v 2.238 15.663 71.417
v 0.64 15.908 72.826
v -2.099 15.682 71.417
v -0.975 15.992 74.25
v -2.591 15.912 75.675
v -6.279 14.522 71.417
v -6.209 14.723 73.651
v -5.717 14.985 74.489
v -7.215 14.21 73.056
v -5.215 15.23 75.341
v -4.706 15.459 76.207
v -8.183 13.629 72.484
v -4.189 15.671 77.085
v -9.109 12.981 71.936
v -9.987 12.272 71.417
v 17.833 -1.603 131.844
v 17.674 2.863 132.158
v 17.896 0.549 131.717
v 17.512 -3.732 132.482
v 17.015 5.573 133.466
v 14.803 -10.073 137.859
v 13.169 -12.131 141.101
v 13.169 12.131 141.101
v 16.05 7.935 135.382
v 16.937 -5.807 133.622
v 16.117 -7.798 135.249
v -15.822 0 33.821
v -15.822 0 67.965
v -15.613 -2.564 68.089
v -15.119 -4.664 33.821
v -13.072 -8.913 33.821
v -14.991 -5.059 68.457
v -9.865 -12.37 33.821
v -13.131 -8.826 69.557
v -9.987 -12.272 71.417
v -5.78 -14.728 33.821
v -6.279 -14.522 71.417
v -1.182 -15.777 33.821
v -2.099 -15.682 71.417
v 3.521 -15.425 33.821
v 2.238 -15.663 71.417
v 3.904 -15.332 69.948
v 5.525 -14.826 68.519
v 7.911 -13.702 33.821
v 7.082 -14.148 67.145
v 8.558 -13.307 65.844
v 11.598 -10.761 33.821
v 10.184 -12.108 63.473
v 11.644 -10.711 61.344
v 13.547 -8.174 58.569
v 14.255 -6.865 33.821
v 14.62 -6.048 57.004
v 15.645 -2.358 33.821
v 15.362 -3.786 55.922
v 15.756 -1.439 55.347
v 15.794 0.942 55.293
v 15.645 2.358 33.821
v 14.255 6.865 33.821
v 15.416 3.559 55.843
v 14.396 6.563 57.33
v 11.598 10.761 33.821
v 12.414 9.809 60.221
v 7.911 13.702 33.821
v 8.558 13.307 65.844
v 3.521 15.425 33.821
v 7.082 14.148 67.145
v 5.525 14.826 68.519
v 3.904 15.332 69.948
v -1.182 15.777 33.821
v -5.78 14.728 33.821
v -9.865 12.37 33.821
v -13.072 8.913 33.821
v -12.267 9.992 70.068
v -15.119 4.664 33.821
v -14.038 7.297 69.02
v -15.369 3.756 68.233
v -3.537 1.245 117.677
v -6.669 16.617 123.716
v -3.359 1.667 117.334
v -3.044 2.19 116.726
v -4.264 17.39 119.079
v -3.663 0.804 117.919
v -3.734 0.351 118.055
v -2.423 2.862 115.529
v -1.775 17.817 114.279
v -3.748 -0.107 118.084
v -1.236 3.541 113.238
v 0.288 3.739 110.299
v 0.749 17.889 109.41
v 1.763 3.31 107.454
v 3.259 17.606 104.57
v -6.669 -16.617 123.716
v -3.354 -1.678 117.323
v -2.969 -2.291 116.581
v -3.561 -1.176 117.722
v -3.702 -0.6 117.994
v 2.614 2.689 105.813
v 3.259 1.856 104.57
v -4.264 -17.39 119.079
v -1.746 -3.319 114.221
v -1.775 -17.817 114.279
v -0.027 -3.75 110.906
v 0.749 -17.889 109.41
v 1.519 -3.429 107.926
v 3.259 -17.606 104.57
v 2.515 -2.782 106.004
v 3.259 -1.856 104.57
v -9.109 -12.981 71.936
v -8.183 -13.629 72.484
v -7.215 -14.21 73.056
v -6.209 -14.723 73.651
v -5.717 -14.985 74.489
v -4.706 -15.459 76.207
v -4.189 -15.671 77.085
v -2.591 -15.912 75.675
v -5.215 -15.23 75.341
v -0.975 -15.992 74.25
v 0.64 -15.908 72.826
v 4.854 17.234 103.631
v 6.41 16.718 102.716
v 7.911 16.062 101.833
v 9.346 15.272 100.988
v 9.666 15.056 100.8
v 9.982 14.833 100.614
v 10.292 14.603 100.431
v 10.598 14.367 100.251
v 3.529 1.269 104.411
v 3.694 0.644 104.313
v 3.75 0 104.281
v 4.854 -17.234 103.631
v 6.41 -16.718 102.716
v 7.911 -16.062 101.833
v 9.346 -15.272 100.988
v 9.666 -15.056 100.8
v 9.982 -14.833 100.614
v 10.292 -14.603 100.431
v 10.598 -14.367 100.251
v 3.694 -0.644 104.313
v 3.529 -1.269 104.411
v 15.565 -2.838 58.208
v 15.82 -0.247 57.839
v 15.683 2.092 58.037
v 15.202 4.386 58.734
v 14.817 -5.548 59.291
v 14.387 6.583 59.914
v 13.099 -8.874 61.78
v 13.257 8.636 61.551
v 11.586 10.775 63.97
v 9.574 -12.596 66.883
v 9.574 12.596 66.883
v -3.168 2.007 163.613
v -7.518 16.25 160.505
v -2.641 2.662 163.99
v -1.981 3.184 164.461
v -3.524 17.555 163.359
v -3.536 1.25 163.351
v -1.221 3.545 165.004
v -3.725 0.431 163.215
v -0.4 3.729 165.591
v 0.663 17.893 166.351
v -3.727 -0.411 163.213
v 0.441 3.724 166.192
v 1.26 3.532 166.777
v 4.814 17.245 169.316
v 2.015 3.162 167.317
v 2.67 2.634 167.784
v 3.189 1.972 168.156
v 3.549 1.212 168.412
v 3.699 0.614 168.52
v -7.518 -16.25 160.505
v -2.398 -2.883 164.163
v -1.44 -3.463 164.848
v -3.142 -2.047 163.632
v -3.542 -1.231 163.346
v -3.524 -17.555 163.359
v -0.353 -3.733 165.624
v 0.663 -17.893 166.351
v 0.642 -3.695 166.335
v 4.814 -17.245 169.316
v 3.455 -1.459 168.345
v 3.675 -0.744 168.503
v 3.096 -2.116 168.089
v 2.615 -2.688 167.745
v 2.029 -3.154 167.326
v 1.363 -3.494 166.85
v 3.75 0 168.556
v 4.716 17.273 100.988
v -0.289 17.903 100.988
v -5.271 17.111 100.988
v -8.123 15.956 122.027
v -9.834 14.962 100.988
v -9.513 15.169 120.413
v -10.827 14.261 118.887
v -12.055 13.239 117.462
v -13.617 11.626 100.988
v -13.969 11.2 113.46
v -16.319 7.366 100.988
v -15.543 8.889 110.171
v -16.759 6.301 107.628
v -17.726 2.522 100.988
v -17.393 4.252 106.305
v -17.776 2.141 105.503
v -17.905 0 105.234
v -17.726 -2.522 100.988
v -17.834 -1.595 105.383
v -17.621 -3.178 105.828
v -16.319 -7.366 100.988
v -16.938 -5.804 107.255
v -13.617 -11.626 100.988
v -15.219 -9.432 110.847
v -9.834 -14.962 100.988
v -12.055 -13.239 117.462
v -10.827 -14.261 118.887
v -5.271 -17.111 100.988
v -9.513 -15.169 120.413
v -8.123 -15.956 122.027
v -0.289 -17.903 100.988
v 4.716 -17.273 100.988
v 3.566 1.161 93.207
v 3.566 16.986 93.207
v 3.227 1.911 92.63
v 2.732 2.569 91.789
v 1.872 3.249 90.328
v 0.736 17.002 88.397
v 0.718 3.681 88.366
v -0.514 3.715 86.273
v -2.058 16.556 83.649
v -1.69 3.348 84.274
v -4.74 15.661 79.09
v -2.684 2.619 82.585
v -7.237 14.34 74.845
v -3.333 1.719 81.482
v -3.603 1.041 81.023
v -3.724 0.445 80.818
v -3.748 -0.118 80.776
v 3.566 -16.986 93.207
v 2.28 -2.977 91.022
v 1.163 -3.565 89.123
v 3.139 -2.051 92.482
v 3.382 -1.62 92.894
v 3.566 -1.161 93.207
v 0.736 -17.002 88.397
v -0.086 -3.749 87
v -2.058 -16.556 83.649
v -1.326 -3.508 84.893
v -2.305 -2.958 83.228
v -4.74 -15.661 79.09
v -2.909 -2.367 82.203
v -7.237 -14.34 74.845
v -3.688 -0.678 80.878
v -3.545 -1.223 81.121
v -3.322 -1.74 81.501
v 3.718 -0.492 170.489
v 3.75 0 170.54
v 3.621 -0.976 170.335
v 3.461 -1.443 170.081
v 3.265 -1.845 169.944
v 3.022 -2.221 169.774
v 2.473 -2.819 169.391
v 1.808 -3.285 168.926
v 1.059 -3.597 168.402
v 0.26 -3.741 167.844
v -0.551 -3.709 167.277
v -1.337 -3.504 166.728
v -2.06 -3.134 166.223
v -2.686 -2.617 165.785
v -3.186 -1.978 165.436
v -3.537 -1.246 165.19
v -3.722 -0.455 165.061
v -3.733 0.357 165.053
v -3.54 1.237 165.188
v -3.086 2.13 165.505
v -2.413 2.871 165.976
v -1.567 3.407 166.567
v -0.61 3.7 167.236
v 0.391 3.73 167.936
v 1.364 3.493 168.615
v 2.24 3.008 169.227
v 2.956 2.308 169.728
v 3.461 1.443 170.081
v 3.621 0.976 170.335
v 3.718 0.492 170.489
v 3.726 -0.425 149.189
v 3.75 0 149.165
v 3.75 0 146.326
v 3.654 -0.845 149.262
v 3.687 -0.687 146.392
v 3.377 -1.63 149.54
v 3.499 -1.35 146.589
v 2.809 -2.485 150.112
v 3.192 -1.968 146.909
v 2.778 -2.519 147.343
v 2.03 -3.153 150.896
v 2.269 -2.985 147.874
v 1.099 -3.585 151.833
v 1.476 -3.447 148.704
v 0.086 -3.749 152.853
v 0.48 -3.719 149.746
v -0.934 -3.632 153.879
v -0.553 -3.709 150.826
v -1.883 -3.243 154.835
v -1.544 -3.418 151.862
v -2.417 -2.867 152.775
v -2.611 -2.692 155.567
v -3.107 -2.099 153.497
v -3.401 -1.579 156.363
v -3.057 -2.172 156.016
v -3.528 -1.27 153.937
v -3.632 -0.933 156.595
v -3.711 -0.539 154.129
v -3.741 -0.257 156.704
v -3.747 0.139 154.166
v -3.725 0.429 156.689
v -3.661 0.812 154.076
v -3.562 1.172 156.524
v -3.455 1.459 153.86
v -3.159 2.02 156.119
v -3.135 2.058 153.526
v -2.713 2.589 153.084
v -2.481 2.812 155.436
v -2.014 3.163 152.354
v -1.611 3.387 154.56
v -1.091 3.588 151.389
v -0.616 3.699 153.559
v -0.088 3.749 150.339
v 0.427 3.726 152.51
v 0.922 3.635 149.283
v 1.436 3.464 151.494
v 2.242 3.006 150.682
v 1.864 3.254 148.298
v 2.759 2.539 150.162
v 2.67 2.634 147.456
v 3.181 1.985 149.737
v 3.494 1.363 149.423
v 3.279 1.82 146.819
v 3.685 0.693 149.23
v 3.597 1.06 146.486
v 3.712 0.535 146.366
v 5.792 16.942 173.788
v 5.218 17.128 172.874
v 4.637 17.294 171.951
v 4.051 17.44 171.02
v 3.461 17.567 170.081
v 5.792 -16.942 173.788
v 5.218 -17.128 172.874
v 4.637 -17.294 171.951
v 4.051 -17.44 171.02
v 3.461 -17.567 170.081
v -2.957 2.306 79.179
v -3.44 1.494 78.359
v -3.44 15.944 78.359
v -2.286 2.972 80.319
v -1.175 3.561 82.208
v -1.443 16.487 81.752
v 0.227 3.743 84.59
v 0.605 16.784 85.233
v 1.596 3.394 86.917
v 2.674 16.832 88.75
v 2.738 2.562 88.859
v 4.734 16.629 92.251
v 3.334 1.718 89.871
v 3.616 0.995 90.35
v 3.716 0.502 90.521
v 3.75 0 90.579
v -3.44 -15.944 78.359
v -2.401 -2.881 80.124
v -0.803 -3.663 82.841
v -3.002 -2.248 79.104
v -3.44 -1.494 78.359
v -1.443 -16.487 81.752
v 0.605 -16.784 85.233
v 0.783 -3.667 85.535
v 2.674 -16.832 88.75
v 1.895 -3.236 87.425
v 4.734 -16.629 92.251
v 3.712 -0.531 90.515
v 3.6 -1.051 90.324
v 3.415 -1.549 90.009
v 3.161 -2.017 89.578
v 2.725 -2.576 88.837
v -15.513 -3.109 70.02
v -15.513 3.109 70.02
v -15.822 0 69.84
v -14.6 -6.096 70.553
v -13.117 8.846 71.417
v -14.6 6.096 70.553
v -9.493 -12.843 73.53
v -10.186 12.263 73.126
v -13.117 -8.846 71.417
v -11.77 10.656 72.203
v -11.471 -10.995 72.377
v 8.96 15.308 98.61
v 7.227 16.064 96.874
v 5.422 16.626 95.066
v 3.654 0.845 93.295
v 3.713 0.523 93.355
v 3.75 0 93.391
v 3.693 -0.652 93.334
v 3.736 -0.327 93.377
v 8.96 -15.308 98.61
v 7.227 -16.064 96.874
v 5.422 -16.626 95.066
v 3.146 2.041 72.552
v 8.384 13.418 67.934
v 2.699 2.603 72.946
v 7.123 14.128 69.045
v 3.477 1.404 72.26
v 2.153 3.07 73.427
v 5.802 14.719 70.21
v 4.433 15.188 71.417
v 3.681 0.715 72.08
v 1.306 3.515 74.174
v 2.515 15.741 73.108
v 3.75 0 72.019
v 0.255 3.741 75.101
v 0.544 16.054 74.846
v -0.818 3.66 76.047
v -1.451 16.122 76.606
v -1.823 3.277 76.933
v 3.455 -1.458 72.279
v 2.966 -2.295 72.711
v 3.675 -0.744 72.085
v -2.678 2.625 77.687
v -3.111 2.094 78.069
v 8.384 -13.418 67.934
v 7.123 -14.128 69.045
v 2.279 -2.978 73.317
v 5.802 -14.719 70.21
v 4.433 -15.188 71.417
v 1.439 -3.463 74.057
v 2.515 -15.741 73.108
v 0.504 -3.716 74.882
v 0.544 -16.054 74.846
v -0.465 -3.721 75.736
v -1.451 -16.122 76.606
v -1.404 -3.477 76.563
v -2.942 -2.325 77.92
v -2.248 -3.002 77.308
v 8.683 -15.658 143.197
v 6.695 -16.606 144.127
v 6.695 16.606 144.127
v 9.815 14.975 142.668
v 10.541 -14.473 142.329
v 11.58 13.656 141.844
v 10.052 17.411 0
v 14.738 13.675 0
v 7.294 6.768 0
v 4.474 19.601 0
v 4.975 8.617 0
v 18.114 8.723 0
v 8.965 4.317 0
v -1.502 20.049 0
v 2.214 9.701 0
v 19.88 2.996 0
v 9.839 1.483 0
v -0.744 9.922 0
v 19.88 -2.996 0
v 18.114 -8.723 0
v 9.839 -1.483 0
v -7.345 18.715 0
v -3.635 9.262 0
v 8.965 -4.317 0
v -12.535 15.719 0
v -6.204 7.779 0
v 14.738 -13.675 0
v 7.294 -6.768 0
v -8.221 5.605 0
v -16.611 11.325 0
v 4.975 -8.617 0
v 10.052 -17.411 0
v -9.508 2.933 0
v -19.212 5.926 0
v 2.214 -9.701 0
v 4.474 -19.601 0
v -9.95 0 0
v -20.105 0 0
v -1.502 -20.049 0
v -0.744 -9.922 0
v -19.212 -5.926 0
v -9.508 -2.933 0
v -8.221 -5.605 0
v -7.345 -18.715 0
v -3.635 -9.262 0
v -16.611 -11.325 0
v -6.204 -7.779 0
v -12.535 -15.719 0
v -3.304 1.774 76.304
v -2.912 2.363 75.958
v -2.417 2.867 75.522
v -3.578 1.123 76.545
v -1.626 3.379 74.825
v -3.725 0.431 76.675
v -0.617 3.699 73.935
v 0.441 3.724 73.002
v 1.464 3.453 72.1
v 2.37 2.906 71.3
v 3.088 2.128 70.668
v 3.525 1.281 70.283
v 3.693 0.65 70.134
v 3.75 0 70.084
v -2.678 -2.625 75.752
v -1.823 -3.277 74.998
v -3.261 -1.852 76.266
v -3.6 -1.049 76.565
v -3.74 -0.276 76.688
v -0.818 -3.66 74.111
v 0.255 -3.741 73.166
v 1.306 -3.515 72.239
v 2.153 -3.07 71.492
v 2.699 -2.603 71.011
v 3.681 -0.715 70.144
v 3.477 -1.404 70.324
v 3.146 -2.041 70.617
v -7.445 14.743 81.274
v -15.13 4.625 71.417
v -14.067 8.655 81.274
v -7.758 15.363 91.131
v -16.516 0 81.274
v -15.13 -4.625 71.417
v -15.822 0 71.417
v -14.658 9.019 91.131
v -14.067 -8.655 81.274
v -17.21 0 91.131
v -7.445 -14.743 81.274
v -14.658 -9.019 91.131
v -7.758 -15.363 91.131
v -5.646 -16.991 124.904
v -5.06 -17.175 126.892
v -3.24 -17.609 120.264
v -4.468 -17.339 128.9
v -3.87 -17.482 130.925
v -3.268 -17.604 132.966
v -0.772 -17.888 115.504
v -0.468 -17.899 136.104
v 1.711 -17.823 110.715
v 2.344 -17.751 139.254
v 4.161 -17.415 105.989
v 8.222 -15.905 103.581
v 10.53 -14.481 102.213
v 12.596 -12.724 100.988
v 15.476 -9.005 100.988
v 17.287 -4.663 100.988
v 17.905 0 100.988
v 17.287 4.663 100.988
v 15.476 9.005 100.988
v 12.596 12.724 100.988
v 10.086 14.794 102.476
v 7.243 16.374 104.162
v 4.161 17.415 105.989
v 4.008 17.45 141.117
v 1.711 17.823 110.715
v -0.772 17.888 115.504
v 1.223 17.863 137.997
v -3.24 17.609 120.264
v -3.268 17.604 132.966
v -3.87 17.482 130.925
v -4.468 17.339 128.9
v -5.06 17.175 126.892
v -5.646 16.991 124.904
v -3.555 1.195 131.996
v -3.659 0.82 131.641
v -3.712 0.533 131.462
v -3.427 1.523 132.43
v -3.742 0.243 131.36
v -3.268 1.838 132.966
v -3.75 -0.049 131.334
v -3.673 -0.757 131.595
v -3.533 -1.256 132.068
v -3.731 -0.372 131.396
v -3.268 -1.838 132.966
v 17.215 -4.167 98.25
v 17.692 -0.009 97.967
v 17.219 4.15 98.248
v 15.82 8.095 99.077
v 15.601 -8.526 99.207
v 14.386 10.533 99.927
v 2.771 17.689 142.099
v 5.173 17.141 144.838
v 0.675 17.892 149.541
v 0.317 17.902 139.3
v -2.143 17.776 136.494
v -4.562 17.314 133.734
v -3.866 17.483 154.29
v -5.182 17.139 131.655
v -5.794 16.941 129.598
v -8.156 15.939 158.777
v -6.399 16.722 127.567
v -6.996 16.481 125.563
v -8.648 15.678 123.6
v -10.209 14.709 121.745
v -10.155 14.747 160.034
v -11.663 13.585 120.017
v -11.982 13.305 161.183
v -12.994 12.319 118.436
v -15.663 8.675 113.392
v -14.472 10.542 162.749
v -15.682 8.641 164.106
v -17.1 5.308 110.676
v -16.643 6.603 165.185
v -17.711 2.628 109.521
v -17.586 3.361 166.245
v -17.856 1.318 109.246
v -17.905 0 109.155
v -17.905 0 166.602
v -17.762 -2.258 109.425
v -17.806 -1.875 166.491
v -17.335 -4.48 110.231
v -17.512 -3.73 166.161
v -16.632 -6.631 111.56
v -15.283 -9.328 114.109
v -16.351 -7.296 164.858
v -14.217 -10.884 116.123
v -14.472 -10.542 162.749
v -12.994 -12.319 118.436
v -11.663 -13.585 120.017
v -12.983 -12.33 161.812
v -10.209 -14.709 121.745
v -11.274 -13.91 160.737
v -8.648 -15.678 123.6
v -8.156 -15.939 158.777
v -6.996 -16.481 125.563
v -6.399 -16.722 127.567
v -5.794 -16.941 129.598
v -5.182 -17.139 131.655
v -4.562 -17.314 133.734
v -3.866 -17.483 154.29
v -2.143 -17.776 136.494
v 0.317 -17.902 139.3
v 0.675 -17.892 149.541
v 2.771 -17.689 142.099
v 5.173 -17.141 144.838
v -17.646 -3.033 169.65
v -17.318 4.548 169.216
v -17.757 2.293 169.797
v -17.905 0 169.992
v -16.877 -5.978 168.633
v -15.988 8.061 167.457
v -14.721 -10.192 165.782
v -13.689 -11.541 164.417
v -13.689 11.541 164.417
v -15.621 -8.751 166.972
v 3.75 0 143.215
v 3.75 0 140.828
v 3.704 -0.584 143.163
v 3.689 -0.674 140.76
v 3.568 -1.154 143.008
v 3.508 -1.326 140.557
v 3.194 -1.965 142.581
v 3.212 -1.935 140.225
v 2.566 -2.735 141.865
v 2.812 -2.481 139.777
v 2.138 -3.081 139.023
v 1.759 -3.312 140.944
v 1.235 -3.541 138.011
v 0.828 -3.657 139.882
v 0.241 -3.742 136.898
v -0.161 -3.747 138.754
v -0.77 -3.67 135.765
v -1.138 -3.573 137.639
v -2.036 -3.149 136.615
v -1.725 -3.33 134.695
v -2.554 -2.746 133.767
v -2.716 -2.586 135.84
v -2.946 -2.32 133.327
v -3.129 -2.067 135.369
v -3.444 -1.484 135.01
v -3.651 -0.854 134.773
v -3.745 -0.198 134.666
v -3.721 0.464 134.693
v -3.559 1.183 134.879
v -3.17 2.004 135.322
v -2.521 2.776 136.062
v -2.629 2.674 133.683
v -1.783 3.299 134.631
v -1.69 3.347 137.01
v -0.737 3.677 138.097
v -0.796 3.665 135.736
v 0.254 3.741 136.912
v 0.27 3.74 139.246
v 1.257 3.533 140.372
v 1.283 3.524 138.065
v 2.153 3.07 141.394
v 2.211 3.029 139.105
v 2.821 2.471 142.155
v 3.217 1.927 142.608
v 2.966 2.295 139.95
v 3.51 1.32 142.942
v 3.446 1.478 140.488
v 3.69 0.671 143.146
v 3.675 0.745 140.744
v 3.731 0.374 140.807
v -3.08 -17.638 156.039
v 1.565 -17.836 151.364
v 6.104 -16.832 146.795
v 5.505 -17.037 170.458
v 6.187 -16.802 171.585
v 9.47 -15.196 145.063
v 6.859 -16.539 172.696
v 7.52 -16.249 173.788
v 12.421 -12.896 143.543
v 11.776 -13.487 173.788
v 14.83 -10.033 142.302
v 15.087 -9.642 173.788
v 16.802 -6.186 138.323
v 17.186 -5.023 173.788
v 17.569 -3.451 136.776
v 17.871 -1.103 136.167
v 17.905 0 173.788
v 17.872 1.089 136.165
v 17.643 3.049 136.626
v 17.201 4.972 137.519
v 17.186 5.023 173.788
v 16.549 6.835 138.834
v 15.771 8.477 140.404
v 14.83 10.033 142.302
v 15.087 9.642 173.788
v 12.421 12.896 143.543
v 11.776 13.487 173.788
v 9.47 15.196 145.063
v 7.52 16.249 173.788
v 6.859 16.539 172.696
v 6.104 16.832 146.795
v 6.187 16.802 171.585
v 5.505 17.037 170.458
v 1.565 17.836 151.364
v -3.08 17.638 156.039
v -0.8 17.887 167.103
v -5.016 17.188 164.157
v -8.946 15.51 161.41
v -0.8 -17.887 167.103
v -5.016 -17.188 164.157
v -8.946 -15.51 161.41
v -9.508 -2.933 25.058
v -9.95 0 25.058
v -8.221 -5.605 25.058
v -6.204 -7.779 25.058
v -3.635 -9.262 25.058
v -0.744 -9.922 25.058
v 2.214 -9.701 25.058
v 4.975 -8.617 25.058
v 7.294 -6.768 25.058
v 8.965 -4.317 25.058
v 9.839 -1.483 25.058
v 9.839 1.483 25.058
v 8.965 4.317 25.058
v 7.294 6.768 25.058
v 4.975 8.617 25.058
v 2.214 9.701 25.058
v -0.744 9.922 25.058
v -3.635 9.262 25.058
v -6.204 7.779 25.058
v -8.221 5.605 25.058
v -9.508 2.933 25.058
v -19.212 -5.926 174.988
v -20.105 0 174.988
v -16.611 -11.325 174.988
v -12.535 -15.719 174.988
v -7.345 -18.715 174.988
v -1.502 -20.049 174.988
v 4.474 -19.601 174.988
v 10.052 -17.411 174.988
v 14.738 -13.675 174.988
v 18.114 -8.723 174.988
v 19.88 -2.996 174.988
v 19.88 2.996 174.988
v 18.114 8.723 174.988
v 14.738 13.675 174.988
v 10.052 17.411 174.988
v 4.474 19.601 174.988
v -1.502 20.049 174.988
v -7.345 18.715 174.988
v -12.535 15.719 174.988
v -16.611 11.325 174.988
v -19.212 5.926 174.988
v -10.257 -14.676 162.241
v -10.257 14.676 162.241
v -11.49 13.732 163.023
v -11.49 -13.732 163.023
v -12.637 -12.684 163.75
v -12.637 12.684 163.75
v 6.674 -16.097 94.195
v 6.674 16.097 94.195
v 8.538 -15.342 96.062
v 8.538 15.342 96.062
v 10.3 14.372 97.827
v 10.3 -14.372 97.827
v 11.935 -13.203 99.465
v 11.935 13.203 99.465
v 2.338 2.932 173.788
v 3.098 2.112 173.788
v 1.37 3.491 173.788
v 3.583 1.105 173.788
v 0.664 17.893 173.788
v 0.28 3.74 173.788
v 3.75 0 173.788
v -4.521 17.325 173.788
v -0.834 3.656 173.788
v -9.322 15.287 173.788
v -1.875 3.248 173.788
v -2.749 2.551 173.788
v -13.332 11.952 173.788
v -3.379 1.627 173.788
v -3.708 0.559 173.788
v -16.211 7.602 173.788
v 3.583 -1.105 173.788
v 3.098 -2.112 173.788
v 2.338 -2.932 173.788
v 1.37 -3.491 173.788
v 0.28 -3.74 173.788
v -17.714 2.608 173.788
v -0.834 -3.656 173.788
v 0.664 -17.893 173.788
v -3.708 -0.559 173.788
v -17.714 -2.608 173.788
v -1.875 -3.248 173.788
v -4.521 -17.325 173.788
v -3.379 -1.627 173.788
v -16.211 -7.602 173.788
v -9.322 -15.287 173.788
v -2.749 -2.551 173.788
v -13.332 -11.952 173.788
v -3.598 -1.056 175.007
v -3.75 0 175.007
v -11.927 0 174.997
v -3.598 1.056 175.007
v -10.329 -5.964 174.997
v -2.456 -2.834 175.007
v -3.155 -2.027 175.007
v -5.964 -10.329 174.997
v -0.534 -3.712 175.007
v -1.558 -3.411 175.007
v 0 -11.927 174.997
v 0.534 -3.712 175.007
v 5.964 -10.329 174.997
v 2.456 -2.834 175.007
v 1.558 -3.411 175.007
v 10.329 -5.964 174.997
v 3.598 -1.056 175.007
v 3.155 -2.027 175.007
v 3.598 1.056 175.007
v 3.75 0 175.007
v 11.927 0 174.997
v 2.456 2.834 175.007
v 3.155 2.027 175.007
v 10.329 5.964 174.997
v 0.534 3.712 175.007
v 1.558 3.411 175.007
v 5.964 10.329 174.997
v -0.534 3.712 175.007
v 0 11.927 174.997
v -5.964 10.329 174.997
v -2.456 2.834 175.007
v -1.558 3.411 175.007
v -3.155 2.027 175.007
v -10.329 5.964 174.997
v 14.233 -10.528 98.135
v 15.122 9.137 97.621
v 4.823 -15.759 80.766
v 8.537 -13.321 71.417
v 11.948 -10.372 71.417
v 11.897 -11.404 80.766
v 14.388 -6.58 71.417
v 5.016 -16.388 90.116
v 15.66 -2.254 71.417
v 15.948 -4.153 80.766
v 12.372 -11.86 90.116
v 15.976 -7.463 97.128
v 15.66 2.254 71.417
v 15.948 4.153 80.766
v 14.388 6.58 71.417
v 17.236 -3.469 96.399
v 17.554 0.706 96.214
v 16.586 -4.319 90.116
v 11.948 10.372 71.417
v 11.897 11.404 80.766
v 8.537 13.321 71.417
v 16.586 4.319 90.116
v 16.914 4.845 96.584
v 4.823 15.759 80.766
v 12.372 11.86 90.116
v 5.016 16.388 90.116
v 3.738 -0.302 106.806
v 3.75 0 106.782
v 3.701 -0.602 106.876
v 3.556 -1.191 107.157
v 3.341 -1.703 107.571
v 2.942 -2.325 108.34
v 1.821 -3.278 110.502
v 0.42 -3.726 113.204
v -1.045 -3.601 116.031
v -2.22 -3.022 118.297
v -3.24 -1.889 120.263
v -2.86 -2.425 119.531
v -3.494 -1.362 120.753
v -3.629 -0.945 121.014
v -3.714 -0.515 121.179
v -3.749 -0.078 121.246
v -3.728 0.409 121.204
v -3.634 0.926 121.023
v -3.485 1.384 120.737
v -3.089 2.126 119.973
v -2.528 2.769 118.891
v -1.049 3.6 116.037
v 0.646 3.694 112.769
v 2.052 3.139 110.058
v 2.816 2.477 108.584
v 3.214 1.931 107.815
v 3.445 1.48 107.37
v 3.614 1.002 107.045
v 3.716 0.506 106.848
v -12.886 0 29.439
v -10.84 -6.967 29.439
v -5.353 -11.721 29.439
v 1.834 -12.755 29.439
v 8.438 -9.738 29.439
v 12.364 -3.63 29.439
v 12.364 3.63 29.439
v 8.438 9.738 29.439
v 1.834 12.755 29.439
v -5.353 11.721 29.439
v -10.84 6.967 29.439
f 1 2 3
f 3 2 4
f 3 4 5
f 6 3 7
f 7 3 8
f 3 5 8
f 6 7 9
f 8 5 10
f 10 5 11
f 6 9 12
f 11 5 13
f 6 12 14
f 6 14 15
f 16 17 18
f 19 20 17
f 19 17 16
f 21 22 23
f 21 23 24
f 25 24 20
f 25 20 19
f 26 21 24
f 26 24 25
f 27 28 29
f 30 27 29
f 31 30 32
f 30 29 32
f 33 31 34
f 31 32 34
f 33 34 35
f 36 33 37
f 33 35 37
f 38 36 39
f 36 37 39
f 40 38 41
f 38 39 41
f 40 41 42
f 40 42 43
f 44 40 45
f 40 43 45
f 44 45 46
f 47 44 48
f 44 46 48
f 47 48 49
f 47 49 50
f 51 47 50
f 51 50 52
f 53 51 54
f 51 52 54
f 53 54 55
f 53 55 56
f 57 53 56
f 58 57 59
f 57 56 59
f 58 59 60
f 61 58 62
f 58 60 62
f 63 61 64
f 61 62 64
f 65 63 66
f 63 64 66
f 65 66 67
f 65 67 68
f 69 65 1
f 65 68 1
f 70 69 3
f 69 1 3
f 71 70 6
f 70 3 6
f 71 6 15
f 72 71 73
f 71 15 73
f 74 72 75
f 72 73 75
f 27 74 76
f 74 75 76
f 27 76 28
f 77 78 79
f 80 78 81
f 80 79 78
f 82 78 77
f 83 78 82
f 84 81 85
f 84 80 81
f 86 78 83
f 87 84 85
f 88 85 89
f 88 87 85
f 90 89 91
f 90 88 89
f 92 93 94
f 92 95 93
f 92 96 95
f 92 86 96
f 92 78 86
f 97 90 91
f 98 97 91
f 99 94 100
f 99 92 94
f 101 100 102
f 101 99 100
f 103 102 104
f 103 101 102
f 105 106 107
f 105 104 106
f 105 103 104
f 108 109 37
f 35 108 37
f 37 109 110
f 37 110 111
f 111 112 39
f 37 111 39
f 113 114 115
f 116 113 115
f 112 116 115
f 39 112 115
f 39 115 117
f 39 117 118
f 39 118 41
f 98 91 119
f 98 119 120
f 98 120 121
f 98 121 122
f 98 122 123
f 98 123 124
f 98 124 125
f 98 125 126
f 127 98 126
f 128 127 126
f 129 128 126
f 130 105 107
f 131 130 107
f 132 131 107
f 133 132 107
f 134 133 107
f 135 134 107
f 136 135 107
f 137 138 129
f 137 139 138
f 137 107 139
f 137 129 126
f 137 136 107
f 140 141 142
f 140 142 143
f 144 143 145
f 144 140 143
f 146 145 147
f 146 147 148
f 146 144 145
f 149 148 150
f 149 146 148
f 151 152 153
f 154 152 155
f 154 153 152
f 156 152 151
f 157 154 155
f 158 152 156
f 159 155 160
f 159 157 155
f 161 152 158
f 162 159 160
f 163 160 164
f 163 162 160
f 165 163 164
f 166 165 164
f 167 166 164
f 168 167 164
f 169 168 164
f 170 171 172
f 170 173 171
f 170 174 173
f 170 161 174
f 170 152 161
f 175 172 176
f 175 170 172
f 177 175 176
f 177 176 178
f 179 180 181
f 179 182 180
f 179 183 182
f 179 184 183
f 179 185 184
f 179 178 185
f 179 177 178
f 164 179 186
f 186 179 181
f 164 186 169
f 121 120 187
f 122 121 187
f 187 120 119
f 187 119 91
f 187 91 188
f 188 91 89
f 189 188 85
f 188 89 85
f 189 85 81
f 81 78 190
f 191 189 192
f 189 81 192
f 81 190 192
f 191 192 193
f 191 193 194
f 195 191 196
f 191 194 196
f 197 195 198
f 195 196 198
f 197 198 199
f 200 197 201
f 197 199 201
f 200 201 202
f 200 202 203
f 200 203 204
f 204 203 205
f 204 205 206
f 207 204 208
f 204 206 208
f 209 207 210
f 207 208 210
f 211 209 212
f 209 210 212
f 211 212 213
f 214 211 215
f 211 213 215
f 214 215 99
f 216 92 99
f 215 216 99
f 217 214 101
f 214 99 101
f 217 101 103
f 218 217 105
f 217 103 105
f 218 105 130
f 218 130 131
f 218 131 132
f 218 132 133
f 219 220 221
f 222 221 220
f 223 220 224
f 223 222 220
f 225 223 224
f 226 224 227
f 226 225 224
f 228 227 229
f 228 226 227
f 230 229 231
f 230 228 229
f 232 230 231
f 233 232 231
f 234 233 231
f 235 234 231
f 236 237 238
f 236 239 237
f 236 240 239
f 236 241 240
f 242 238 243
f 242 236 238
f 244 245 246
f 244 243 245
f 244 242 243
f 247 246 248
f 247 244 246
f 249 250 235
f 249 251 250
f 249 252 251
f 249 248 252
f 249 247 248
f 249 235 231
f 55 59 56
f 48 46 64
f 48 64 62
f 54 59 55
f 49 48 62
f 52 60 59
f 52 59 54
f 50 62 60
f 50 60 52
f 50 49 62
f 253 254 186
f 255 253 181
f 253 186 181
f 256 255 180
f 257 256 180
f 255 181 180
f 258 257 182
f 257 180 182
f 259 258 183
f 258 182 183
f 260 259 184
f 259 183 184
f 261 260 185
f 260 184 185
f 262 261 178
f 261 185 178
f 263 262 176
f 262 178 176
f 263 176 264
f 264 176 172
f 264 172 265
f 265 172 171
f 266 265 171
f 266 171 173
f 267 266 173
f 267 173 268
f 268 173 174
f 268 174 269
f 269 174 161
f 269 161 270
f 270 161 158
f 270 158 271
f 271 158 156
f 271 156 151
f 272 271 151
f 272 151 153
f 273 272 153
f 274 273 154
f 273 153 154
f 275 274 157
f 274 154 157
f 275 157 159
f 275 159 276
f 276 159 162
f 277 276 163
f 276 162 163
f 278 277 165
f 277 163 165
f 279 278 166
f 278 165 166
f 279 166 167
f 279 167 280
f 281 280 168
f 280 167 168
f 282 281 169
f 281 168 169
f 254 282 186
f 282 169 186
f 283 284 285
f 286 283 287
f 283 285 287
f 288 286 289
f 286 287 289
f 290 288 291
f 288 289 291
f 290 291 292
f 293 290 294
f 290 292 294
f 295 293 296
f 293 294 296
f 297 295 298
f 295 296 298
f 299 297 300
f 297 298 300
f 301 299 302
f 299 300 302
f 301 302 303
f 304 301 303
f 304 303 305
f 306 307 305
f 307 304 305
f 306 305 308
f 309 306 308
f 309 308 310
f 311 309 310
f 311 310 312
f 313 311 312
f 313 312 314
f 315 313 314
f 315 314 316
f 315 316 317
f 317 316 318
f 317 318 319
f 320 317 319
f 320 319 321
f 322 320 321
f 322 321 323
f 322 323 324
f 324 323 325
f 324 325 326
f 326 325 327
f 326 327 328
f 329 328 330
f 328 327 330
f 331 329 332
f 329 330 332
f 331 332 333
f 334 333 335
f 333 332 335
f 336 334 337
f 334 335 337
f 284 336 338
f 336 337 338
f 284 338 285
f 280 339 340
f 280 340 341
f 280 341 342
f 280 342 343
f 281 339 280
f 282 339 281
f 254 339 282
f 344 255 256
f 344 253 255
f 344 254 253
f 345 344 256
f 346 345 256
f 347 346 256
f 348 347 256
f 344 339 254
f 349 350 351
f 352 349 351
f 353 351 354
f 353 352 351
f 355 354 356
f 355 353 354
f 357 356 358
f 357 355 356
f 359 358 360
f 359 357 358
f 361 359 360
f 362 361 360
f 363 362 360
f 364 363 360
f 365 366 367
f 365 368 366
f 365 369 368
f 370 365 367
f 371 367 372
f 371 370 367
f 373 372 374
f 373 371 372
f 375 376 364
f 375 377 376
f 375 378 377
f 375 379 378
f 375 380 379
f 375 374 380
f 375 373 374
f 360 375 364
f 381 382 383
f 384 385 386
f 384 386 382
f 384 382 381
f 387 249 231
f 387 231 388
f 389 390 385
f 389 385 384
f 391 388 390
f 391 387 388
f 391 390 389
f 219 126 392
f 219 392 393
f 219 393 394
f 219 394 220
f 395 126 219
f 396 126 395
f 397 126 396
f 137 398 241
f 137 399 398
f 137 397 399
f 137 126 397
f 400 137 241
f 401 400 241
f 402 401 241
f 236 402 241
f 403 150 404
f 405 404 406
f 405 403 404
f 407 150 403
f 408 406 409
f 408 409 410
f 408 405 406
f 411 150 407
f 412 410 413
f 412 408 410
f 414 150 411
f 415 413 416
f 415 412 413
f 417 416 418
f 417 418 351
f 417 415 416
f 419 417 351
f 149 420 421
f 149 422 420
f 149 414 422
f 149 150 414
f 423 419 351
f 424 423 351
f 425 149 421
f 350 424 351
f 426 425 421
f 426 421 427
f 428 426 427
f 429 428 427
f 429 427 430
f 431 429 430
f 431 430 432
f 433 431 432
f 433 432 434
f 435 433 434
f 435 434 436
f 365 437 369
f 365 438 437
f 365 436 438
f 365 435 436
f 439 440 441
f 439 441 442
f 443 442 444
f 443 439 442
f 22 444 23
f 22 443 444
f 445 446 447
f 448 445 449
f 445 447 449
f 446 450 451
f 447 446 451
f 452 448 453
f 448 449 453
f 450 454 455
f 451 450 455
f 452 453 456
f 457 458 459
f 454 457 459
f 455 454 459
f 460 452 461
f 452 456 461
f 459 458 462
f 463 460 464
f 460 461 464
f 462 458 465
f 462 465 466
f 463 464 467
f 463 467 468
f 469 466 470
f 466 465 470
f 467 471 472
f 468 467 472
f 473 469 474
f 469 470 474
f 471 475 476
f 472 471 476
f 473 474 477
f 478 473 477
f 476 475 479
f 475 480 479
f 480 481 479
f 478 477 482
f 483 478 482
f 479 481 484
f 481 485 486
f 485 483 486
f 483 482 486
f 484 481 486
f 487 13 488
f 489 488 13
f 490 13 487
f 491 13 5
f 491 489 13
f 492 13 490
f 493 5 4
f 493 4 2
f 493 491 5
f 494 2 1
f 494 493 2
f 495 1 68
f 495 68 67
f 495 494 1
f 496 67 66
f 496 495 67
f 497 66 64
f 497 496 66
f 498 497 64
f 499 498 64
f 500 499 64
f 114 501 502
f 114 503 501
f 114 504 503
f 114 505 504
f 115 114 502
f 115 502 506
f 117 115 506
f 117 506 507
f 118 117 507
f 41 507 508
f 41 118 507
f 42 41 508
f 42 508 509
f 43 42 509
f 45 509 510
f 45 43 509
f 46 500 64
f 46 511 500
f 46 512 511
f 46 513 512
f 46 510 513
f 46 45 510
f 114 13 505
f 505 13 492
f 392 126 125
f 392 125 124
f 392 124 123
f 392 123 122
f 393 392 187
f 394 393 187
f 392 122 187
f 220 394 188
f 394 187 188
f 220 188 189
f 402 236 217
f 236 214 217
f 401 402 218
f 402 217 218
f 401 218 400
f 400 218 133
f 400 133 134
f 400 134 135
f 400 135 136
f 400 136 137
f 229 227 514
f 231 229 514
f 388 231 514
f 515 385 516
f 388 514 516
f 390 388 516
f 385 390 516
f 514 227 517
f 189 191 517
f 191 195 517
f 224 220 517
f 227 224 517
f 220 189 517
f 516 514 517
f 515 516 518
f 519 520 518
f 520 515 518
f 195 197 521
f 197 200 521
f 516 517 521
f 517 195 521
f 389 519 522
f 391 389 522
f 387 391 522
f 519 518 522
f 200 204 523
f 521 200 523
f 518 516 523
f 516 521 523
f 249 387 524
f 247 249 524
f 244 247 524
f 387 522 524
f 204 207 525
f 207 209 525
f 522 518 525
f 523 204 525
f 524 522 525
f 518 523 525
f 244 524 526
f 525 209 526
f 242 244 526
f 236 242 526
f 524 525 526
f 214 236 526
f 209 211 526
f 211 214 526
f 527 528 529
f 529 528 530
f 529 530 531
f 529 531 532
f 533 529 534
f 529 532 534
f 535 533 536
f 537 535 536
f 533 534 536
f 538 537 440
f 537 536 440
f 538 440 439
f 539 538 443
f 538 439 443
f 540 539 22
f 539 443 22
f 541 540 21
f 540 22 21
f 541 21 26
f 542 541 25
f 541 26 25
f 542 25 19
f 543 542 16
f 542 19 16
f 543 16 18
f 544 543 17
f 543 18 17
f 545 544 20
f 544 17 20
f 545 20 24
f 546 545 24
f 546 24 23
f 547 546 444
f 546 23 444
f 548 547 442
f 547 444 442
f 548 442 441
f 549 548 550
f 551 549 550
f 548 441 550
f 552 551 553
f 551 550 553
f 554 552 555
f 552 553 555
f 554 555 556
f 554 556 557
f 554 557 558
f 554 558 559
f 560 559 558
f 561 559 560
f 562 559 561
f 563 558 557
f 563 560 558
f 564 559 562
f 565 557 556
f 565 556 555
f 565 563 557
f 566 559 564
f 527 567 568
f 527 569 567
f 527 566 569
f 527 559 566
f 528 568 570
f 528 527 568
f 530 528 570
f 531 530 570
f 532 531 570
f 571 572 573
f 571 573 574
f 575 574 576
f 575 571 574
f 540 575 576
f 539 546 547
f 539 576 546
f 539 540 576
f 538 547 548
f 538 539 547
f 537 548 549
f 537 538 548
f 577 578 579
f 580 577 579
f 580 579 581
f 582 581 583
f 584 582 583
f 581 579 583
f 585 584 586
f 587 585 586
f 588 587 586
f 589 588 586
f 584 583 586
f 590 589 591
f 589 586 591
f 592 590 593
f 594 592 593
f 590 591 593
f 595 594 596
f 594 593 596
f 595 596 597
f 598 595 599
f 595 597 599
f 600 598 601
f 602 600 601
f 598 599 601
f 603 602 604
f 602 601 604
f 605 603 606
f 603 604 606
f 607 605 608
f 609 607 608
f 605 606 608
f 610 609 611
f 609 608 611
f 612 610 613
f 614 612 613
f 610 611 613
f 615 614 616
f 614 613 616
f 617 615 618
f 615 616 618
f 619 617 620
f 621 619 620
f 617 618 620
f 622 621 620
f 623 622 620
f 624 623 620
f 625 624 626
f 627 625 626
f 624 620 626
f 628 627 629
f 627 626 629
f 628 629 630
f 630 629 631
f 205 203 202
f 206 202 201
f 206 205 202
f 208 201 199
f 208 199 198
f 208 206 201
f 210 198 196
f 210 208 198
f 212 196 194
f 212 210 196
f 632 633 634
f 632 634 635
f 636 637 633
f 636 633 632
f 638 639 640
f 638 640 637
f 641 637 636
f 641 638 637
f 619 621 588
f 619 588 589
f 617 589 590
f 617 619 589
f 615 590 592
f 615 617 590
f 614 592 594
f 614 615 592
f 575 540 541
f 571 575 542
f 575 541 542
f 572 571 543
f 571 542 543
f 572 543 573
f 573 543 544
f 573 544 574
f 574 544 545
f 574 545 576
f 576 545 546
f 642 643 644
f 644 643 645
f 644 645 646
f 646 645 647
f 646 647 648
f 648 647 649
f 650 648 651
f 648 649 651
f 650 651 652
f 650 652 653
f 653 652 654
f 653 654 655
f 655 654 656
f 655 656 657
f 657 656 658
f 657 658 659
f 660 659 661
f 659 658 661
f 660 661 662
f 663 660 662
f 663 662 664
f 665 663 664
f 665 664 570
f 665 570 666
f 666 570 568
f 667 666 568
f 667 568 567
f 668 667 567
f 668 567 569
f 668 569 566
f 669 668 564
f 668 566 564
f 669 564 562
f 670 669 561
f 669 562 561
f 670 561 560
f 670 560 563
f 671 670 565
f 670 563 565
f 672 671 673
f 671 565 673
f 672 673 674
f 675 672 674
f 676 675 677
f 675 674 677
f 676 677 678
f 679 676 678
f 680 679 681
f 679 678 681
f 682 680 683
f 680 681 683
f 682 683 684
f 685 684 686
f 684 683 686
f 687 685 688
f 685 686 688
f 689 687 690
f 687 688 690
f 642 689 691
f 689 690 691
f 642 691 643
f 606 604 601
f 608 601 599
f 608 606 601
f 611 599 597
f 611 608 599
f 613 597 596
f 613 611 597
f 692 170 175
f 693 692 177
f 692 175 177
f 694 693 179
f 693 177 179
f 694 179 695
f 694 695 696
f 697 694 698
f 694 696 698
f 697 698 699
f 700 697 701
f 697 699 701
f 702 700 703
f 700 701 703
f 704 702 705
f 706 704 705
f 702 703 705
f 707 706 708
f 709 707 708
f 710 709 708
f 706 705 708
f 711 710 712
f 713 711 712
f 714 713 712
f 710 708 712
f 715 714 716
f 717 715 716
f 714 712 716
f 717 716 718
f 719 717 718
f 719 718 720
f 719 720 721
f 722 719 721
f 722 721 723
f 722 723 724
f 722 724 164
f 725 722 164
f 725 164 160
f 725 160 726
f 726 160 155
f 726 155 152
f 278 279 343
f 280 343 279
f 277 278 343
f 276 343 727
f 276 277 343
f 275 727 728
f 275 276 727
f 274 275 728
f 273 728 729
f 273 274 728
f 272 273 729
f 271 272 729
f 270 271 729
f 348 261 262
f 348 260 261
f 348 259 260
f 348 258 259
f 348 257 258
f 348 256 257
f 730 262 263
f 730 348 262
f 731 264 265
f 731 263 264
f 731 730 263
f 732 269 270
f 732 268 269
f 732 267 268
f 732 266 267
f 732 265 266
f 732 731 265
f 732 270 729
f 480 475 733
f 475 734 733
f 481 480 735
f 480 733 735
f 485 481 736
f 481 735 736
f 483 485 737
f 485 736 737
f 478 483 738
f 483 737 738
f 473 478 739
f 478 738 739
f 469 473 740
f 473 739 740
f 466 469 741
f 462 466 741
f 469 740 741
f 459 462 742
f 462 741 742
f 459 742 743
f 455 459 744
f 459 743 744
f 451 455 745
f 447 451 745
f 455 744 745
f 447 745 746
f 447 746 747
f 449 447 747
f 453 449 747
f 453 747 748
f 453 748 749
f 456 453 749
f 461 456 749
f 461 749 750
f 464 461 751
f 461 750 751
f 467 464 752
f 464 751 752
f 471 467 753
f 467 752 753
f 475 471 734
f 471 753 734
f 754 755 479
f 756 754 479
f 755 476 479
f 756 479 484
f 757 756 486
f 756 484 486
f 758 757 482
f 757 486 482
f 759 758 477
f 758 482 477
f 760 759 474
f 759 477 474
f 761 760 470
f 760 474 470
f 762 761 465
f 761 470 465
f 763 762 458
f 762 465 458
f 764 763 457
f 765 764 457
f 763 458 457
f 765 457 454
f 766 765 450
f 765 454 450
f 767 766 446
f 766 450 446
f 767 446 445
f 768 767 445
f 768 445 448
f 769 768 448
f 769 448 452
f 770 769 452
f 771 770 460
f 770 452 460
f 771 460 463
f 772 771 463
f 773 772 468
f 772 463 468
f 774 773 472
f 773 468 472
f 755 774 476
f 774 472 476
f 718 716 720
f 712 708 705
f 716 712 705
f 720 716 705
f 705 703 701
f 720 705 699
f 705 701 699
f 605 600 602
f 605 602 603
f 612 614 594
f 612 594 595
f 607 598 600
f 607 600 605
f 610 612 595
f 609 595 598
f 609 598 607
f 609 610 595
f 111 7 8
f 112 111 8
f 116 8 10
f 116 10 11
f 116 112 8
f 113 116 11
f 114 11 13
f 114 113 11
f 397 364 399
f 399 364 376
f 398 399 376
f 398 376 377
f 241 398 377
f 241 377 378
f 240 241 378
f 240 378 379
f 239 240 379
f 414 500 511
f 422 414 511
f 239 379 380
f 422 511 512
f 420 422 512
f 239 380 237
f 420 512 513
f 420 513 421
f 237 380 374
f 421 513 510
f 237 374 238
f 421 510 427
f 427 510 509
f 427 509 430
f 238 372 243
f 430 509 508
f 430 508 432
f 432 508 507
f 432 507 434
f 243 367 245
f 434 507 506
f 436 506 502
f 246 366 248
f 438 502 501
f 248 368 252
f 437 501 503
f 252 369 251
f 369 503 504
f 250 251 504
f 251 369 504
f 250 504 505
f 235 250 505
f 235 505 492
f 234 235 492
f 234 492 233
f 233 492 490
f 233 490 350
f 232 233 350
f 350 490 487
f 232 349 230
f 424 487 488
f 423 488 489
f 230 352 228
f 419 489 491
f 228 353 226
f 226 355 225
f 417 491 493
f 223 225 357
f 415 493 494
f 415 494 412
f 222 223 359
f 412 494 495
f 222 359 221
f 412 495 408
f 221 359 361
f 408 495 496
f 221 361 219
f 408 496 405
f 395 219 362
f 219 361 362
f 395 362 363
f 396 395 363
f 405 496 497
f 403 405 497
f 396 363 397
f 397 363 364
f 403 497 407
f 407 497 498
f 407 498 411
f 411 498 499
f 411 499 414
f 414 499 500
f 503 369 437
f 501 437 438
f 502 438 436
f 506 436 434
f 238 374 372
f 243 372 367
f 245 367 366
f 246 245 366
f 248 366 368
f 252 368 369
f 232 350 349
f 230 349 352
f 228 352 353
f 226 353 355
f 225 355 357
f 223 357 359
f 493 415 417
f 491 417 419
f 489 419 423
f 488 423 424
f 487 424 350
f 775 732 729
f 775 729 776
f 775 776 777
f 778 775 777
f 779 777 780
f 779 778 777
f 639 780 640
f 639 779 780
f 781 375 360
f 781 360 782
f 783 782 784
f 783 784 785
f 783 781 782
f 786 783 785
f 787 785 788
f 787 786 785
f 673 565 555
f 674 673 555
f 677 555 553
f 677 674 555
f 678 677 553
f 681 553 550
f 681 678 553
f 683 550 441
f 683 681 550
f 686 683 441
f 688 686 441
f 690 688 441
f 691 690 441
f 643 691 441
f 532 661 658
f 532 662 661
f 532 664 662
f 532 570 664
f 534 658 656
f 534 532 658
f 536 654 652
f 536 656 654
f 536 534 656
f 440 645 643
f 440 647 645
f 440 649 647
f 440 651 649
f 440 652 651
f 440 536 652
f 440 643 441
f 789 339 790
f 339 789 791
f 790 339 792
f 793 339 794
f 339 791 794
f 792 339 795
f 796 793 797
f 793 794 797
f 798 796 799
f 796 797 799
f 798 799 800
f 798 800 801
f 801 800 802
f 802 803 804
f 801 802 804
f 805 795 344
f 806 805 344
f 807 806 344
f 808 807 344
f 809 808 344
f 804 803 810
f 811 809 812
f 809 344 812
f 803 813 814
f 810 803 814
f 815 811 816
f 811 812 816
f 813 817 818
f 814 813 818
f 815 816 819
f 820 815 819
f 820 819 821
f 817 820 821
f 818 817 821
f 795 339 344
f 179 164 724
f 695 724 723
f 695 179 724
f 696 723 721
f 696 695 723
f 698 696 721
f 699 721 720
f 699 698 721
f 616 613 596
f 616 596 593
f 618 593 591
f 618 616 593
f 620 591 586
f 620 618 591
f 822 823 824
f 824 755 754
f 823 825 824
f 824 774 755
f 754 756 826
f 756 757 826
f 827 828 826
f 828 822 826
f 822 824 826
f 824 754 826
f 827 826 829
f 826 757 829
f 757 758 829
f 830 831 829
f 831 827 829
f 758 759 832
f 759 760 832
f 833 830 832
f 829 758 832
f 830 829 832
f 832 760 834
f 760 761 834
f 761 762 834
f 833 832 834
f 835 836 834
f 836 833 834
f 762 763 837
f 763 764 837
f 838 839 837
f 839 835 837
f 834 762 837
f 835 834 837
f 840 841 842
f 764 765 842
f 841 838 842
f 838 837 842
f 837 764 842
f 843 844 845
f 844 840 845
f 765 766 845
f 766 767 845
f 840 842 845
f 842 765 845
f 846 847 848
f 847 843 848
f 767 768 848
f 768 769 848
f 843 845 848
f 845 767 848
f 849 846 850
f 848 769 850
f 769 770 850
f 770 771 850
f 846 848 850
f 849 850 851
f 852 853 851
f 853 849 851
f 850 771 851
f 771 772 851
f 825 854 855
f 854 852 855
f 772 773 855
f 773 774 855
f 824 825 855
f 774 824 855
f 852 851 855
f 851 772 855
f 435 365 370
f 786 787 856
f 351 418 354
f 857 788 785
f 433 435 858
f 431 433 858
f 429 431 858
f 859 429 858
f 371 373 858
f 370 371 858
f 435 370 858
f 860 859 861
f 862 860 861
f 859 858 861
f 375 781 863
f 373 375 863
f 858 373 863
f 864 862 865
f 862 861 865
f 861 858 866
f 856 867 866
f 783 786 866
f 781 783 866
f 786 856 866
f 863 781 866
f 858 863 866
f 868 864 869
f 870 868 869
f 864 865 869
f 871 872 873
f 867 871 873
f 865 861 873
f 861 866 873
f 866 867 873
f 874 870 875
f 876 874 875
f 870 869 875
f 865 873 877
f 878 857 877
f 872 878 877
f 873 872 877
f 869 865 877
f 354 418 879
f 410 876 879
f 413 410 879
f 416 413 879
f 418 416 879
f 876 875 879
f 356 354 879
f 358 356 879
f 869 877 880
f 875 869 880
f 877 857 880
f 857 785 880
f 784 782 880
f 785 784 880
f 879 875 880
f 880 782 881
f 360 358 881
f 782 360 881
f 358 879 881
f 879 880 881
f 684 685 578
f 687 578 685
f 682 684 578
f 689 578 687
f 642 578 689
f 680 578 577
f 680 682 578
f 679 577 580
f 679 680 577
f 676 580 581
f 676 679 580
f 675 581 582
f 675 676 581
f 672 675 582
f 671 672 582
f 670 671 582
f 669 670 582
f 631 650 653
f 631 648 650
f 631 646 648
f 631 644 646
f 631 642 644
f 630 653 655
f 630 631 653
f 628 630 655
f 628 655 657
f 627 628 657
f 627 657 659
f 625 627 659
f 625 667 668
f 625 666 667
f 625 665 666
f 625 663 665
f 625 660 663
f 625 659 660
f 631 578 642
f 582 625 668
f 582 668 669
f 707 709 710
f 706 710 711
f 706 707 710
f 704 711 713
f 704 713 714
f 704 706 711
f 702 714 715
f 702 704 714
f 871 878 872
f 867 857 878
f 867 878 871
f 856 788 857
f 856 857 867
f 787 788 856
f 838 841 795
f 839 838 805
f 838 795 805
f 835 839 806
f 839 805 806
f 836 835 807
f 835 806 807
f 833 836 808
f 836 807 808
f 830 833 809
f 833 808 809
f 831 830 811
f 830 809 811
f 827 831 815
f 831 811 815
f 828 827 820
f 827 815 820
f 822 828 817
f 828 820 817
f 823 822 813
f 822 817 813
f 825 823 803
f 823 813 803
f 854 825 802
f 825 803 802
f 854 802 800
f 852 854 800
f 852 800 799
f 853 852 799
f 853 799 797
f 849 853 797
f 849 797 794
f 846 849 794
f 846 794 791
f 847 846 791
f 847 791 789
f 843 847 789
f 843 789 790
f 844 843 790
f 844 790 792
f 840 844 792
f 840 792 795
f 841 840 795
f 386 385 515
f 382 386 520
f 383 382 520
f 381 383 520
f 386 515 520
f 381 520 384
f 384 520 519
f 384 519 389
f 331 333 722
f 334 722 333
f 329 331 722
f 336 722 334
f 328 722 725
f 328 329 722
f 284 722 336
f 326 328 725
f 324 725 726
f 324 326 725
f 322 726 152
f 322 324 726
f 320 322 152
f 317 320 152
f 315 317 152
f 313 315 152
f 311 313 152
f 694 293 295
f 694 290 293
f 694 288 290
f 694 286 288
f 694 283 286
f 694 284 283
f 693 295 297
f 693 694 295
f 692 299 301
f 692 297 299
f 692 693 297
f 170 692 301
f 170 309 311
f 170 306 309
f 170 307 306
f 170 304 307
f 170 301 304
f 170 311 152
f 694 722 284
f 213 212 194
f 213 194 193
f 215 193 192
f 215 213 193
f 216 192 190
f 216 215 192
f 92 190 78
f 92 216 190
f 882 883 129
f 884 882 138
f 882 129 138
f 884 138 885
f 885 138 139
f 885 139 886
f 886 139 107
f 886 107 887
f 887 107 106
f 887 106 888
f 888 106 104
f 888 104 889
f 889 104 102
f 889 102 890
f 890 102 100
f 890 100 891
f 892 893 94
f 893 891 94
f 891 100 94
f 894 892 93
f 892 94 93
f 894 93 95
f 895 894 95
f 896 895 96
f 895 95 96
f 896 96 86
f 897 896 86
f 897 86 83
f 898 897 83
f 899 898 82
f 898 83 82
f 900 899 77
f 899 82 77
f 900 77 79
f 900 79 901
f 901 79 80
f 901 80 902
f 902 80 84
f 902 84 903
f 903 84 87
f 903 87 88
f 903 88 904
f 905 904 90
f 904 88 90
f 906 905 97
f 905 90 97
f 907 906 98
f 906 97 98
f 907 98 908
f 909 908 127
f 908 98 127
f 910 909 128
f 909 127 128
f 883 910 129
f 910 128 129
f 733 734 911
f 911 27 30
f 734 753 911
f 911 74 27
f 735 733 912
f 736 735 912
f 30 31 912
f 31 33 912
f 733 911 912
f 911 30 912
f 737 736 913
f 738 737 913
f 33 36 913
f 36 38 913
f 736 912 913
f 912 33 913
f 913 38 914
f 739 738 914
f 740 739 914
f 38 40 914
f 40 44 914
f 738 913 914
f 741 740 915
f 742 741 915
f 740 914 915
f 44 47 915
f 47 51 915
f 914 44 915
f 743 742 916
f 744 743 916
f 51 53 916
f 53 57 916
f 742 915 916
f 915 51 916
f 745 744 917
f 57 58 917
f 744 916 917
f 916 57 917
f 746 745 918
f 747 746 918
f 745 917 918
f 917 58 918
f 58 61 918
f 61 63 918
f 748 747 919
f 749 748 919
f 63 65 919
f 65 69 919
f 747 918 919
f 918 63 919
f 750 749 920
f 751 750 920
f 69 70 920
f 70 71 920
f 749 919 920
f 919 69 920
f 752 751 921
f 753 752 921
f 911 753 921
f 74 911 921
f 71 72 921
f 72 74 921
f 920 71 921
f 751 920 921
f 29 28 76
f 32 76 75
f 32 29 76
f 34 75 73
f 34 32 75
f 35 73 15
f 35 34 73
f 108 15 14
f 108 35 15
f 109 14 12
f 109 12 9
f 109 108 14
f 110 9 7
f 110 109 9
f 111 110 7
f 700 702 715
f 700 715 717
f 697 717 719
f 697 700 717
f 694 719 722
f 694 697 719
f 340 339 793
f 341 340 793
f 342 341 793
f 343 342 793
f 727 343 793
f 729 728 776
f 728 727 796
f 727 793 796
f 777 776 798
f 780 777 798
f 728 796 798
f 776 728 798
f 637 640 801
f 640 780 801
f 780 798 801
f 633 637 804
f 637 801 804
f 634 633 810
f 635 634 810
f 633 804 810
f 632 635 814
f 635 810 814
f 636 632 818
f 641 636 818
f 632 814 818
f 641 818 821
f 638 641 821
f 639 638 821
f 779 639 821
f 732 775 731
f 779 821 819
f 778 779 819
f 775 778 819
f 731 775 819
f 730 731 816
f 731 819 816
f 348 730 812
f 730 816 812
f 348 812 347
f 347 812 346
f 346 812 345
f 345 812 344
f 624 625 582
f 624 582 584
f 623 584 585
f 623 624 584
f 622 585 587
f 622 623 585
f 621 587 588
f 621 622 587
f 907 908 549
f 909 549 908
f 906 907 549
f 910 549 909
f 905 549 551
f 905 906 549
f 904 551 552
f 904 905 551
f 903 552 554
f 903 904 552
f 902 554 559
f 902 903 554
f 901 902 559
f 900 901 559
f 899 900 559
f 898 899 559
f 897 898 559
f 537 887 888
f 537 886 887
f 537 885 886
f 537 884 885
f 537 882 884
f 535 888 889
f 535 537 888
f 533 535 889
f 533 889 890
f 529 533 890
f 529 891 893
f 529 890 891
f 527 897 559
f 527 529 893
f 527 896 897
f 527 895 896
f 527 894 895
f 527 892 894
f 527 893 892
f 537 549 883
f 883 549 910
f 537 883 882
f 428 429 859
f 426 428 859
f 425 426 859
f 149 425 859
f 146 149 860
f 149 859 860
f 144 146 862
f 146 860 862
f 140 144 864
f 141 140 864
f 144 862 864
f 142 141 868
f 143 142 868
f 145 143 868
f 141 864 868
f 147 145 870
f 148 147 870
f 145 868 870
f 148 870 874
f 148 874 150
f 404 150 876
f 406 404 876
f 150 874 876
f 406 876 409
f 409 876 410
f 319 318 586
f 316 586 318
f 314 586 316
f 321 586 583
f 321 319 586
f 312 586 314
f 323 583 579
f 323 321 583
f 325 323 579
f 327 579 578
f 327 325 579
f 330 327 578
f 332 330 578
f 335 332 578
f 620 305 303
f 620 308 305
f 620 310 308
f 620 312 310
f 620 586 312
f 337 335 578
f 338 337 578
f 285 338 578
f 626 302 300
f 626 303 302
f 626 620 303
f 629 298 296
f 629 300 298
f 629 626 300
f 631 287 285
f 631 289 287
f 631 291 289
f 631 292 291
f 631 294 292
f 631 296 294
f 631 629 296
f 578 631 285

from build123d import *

# Parameters (mm, degrees)
F3_DEPTH      = 25
F3_DEPTH_BACK = 25
F7_R          = 3.75
F8_DEPTH      = 175.008284


with BuildPart() as f3:
    # F1 (on Front) → F3 (new body, two sides)
    with BuildSketch(Plane.XZ) as f3_sk:
        Polygon((-13.689034, 164.416686), (-18.182479, 170.359462), (-18.182479, 166.913599), (-14.472469, 162.748992), (-8.156137, 158.776864), (5.172722, 144.838229), (-4.562378, 133.733749), (-6.996153, 125.563219), (-12.993669, 118.435733), (-18.100433, 108.785093), (-18.182479, 104.653799), (-12.05458, 117.461517), (-6.668613, 123.716192), (3.25861, 104.569836), (10.598217, 100.251484), (3.565824, 93.206773), (-7.237375, 74.845315), (-18.281374, 68.406361), (-18.237878, 66.536016), (-6.20943, 73.651383), (-4.18945, 77.084604), (8.558222, 65.844081), (18.144256, 51.864788), (18.144256, 54.47248), (9.574368, 66.883489), (-3.439697, 78.358909), (4.734092, 92.251338), (11.93507, 99.464929), (18.187713, 95.84786), (18.187713, 97.673245), (4.161306, 105.989113), (-5.645856, 124.90391), (-3.268425, 132.966489), (6.69481, 144.126818), (13.16941, 141.100645), (18.144252, 131.225541), (18.144252, 135.615155), (14.830102, 142.302305), (6.104447, 146.795377), (-7.517676, 160.505265), (4.814246, 169.316471), (7.670024, 174.035177), (5.975025, 174.078628), (3.461061, 170.081015), (-8.945923, 161.410491), align=None)
    extrude(amount=F3_DEPTH)
    extrude(f3_sk.sketch, amount=-F3_DEPTH_BACK)

    # F4 (on Front) → F5 (revolve, cut)
    with BuildSketch(Plane.XZ):
        Polygon((50.79839, 174.967825), (17.925017, 175.093472), (17.925017, -3.259191), (50.79839, -3.259191), align=None)
    revolve(axis=Axis((0, 0, 87.499648), (0, 0, 1)), mode=Mode.SUBTRACT)

    # F2 (on Front) → F6 (revolve)
    with BuildSketch(Plane.XZ):
        Polygon((-3.515409, 175.007284), (-20.104863, 174.987718), (-20.104863, 0), (-9.95, 0), (-9.95, 25.057623), (-15.821613, 33.821163), (-15.821613, 71.417056), (-17.904863, 100.988127), (-17.904863, 173.787653), (-3.515409, 173.787653), align=None)
    revolve(axis=Axis((0, 0, 12.804373), (0, 0, 1)))

    # F7 (on face) → F8 (cut, through all)
    with BuildSketch(Plane(origin=(0, 0, 0), x_dir=(1, 0, 0), z_dir=(0, 0, -1))):
        Circle(F7_R)
    extrude(amount=-F8_DEPTH, mode=Mode.SUBTRACT)


solid = f3.part
